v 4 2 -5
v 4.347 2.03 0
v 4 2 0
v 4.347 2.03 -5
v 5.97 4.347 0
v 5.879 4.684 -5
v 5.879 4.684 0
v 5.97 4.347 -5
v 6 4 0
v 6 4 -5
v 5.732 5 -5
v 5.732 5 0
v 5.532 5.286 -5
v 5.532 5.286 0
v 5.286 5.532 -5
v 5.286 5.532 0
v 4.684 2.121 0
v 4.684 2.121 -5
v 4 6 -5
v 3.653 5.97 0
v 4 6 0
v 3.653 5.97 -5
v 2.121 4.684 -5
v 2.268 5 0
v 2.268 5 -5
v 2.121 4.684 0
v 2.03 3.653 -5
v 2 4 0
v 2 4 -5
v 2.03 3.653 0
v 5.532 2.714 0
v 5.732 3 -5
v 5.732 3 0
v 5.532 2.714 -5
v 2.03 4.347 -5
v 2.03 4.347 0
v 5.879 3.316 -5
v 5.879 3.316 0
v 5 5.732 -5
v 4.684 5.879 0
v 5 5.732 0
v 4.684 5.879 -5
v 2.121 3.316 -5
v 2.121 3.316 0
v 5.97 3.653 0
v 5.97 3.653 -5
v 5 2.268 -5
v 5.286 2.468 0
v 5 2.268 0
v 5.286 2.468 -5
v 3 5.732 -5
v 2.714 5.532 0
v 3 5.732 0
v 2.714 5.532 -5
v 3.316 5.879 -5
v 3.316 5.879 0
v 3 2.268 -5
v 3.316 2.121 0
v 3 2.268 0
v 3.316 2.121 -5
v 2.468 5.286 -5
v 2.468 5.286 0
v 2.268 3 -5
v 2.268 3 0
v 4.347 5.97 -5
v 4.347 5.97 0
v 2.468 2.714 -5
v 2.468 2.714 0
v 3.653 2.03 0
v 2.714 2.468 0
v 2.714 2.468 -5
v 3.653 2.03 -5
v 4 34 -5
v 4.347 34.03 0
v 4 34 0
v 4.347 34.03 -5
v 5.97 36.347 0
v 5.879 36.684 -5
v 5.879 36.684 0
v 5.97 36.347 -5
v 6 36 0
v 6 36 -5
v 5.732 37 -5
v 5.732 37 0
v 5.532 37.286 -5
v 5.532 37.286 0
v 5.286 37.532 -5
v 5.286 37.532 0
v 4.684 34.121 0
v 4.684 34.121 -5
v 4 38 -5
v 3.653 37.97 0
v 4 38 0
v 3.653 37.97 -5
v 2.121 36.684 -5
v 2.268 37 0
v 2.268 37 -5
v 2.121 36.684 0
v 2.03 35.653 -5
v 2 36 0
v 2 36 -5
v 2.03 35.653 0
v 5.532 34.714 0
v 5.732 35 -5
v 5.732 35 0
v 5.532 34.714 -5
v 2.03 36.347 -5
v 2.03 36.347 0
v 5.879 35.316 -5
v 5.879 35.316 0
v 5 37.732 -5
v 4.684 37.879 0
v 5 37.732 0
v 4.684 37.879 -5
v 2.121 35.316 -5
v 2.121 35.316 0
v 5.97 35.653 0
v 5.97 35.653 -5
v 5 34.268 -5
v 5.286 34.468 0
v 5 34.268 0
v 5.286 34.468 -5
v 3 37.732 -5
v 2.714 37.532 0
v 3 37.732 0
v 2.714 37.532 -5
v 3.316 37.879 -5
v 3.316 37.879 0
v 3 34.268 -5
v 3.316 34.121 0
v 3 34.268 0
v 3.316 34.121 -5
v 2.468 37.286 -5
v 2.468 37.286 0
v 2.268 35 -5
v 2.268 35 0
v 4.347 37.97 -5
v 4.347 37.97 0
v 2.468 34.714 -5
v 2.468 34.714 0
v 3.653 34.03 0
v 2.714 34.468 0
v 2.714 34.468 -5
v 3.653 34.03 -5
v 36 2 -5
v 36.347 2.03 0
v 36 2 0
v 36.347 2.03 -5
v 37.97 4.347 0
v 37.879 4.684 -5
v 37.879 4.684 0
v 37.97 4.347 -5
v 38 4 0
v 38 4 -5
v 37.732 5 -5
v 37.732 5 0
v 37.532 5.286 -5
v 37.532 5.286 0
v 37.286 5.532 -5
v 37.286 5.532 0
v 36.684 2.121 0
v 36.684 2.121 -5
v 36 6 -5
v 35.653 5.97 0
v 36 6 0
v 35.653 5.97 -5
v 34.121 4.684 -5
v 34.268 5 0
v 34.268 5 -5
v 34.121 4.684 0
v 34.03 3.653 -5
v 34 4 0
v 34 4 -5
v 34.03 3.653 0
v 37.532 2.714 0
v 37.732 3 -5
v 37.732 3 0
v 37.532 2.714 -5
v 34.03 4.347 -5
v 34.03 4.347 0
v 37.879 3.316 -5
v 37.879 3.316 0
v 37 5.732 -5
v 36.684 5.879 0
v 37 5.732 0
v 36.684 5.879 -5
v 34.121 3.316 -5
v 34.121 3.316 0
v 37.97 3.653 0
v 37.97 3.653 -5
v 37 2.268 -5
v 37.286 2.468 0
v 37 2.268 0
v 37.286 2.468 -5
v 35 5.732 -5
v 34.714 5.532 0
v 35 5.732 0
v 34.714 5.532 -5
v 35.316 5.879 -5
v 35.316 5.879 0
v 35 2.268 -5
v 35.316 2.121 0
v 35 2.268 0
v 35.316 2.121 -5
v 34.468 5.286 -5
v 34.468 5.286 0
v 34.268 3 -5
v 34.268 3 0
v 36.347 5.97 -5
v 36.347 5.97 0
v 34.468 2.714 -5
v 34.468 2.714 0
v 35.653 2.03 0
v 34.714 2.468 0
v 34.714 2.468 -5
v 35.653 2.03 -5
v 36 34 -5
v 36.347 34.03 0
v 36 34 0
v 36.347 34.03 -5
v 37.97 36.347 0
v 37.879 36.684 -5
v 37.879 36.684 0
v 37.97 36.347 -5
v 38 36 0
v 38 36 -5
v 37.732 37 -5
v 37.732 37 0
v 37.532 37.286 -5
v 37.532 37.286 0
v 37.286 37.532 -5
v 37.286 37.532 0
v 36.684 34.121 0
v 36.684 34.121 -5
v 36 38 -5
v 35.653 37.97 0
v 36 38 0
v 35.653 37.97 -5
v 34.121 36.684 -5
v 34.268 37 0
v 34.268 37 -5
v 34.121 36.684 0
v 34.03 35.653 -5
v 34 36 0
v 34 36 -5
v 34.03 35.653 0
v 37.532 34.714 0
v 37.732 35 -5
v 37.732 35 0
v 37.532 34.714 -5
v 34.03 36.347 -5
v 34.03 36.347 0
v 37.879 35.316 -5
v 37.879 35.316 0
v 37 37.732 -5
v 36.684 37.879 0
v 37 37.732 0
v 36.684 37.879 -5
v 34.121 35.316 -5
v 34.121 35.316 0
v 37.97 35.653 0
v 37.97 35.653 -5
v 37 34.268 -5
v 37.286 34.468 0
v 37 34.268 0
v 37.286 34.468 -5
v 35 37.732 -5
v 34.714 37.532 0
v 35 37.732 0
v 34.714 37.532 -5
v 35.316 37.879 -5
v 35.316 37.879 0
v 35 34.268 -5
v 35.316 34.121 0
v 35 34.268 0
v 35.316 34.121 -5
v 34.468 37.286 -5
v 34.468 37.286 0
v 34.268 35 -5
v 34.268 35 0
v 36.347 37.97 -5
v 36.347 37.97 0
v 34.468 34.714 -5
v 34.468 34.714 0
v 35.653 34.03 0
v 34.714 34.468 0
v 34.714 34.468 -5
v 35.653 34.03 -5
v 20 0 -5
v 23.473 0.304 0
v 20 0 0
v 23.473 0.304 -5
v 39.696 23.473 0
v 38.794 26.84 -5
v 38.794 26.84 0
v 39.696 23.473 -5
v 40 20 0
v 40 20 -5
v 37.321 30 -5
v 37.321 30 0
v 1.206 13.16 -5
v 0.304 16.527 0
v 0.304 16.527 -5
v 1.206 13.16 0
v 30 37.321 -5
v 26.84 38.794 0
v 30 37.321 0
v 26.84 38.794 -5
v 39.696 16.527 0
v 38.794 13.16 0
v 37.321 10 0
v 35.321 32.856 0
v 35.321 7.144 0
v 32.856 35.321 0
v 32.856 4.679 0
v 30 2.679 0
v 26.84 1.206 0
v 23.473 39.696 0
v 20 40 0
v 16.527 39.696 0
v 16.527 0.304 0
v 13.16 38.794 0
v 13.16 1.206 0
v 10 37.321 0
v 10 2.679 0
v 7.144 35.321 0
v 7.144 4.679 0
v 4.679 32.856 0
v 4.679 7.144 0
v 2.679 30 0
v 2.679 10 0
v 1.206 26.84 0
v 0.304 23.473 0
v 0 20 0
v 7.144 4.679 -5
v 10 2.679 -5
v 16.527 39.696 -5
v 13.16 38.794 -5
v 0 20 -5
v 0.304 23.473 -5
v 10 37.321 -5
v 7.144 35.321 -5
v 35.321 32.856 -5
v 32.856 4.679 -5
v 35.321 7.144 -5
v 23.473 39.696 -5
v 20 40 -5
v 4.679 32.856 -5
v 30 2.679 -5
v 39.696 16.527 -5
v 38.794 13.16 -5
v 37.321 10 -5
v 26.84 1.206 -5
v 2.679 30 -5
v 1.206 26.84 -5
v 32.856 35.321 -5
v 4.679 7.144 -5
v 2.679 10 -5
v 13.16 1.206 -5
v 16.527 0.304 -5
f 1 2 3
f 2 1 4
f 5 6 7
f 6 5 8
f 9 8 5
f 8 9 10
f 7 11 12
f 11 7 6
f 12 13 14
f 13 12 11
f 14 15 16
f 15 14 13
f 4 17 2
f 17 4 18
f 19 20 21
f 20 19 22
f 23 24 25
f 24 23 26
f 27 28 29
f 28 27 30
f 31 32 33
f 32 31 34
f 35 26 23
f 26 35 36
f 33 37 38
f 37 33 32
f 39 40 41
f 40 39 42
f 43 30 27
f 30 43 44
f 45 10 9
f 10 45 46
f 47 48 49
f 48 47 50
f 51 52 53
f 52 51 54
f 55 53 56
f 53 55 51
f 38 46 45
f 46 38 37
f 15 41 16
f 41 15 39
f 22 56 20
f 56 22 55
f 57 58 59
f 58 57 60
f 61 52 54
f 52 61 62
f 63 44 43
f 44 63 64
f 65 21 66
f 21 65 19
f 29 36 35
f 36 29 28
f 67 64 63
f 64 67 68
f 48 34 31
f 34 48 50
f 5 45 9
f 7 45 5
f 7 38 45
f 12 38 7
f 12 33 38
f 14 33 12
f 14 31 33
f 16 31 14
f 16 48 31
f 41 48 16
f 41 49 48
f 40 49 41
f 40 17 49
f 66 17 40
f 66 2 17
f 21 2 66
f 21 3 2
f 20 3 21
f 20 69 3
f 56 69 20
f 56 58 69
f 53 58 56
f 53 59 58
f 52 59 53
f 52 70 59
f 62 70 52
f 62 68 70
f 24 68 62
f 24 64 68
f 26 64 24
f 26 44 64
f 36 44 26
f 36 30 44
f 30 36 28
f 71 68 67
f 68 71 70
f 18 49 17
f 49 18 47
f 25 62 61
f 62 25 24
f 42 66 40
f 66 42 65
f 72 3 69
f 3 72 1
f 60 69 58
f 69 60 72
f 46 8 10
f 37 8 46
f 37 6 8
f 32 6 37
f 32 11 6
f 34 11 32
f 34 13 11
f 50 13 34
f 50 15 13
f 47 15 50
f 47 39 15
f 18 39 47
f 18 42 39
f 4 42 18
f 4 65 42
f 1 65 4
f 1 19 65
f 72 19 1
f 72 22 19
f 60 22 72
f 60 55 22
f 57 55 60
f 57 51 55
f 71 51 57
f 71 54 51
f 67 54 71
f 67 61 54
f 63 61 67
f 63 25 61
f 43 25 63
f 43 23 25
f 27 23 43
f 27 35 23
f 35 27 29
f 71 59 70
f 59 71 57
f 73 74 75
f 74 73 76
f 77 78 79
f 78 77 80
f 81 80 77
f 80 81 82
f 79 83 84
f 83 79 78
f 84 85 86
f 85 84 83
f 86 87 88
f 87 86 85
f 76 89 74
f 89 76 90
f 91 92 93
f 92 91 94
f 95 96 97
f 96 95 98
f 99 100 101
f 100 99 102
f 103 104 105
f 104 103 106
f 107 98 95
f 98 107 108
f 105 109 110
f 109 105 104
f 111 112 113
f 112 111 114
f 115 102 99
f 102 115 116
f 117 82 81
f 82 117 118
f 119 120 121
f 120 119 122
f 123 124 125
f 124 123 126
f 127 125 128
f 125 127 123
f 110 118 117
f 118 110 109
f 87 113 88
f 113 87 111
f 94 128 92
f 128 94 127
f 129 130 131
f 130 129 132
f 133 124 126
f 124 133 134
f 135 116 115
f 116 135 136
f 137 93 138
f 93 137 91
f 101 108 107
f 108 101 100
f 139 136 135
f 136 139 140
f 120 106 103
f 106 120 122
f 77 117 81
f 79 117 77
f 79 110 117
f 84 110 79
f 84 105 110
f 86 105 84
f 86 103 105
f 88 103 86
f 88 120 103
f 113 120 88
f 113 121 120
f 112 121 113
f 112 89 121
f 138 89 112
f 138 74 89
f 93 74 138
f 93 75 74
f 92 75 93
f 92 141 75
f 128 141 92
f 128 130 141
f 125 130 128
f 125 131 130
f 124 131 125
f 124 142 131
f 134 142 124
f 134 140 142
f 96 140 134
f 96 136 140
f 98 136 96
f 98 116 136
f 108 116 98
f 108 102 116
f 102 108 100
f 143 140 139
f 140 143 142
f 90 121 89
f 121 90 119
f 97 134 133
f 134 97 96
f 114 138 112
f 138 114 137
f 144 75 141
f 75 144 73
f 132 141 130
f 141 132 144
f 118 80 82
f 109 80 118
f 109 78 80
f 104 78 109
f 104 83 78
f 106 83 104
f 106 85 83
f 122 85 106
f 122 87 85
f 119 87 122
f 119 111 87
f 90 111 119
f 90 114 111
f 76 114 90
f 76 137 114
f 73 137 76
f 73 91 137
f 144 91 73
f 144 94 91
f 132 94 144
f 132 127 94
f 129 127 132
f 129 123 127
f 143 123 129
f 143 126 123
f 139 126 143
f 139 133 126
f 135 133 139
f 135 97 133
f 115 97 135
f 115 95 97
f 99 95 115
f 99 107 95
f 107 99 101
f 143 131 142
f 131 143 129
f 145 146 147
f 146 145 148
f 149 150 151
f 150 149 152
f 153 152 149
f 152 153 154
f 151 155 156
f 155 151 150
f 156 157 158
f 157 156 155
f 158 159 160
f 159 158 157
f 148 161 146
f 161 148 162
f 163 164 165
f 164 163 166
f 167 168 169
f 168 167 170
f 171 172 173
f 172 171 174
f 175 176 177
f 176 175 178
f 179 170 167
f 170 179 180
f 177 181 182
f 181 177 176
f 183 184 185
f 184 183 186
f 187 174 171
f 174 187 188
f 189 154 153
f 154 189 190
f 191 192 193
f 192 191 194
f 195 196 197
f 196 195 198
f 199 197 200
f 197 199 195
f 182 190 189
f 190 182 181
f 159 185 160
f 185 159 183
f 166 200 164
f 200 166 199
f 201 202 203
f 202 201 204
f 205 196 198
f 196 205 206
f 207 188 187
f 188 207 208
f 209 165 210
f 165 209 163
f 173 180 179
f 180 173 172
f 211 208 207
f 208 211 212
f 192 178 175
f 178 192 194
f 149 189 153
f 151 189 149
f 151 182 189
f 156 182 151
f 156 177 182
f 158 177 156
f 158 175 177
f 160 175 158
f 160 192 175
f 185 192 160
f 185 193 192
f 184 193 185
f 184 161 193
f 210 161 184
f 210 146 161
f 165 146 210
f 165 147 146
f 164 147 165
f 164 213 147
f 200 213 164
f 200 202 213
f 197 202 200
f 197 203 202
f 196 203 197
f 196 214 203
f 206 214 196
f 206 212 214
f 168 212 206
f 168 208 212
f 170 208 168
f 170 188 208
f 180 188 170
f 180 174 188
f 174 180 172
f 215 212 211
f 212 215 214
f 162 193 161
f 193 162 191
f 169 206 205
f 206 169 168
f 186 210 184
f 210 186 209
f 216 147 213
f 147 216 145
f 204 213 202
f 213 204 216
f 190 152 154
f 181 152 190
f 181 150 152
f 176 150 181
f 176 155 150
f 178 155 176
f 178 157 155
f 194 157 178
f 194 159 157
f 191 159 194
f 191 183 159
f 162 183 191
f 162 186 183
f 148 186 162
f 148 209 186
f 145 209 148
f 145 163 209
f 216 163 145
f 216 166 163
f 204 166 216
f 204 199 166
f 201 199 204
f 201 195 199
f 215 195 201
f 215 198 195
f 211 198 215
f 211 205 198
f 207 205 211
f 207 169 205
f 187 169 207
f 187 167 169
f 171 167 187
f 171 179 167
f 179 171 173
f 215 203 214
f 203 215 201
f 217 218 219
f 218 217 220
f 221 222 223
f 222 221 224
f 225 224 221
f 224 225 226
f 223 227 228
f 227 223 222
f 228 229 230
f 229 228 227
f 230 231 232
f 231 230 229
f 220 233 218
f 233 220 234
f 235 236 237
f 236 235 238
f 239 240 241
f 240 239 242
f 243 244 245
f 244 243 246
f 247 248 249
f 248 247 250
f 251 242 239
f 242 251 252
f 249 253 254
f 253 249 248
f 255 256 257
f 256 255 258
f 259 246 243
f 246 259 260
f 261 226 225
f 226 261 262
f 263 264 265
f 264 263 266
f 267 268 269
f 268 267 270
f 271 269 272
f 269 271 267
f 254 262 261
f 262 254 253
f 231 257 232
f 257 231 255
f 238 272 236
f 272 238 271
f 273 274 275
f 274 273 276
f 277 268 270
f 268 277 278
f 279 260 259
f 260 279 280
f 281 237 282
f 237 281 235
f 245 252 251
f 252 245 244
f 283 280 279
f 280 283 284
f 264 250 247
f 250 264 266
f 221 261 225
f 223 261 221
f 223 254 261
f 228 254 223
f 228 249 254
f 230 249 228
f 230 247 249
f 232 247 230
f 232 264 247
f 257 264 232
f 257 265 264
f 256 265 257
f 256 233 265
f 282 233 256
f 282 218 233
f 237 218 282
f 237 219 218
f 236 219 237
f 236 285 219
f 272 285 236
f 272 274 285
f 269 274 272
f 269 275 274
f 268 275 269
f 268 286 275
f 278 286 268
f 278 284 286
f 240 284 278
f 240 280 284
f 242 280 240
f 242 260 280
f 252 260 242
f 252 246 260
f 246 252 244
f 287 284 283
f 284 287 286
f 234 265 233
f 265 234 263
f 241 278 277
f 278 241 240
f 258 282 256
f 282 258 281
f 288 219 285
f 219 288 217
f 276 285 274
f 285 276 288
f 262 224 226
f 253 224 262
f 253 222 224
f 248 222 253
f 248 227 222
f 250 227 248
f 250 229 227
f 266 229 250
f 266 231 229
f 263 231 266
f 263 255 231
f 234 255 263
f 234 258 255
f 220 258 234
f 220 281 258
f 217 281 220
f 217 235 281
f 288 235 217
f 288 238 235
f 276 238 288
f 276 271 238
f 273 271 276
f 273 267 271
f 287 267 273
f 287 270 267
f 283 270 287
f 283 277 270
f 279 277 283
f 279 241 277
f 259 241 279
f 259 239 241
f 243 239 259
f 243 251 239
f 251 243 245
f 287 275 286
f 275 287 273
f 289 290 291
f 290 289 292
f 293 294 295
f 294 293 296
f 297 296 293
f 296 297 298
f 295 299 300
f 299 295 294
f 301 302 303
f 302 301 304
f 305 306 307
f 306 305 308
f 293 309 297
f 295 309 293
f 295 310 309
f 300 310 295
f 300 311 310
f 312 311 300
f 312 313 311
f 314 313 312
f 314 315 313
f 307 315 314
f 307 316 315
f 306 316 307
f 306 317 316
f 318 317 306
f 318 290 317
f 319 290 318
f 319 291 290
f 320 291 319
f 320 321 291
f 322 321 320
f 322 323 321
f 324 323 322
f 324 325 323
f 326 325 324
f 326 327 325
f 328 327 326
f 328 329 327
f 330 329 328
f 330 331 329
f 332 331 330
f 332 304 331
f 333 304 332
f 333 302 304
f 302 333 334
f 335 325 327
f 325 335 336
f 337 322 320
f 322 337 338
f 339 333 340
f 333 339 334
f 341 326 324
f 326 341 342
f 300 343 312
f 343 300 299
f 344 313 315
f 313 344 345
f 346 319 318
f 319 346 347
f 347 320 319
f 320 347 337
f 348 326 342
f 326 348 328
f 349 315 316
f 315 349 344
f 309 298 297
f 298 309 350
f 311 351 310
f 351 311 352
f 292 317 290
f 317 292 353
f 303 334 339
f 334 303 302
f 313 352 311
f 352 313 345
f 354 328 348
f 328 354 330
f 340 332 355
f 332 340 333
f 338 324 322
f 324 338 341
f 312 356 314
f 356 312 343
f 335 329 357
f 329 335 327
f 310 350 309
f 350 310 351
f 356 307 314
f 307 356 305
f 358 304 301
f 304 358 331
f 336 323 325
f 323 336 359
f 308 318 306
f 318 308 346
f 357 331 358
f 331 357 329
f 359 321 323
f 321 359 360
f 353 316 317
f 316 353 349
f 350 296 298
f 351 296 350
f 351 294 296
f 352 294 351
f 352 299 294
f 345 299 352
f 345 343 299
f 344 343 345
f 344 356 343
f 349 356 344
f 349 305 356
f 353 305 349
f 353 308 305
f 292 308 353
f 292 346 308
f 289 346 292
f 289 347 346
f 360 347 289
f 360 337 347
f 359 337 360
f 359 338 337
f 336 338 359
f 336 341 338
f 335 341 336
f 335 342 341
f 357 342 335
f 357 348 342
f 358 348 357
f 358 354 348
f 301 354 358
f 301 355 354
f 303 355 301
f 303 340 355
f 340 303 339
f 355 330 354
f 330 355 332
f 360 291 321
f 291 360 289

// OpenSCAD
// file: posts.scad
/* Developed by Alex Grutter */

$fn = 36;

four_posts_with_supports(10, 3, 2, 25, 50, 5, 1, [0,0,0,0], 1, true);

module four_posts(post_height, post_outer_diameter, post_inner_diameter, post_spacing_width, post_spacing_length){
    difference()
    {
		/* Outer part */
		union()
		{
            translate([0, 0, 0])
            {
                cylinder(h = post_height, d = post_outer_diameter);
            }
            translate([0, post_spacing_length + 0, 0])
            {
                cylinder(h = post_height, d = post_outer_diameter);
            }
            translate([post_spacing_width + 0, 0, 0])
            {
                cylinder(h = post_height, d = post_outer_diameter);
            }
            translate([post_spacing_width + 0, post_spacing_length + 0, 0])
            {
                cylinder(h = post_height, d = post_outer_diameter);
            }
		}
		/* Inner hole */
        union()
        {
            translate([0, 0, -1])
            {
                cylinder(h = post_height+2, d = post_inner_diameter);
            }
            translate([0, post_spacing_length + 0, -1])
            {
                cylinder(h = post_height+2, d = post_inner_diameter);
            }
            translate([post_spacing_width + 0, 0, -1])
            {
                cylinder(h = post_height+2, d = post_inner_diameter);
            }
            translate([post_spacing_width + 0, post_spacing_length + 0, -1])
            {
                cylinder(h = post_height+2, d = post_inner_diameter);
            }
        }
	}
};

module four_posts_with_supports(post_height, post_outer_diameter, post_inner_diameter, post_spacing_width, post_spacing_length, support_diameter, support_count, support_start_angle, support_thickness, flip){
    difference()
    {
		/* Outer part */
		union()
		{
            translate([0, 0, 0])
            {
                cylinder(h = post_height, d = post_outer_diameter);
				for(support = [0 : support_count])
				{
					if(flip)
					{
						translate([0, 0, post_height])
						rotate([support_start_angle[0] + ( support * (360 / support_count)),90,0])
						translate([0, 0, -(support_thickness / 2)])
						linear_extrude(support_thickness)
						polygon([[post_height, (post_inner_diameter / 2)],[0, (post_inner_diameter / 2)],[0,(support_diameter / 2)]], [[0,1,2]]);
					}
					else
					{
						rotate([support_start_angle[0] + ( support * (360 / support_count)),-90,0])
						translate([0, 0, -(support_thickness / 2)])
						linear_extrude(support_thickness)
						polygon([[post_height, (post_inner_diameter / 2)],[0, (post_inner_diameter / 2)],[0, (support_diameter / 2)]], [[0,1,2]]);
					}
				}
            }
            translate([0, post_spacing_length + 0, 0])
            {
                cylinder(h = post_height, d = post_outer_diameter);
				for(support = [0 : support_count])
				{
					if(flip)
					{
						translate([0, 0, post_height])
						rotate([support_start_angle[1] + ( support * (360 / support_count)),90,0])
						translate([0, 0, -(support_thickness / 2)])
						linear_extrude(support_thickness)
						polygon([[post_height, (post_inner_diameter / 2)],[0, (post_inner_diameter / 2)],[0,(support_diameter / 2)]], [[0,1,2]]);
					}
					else
					{
						rotate([support_start_angle[1] + ( support * (360 / support_count)),-90,0])
						translate([0, 0, -(support_thickness / 2)])
						linear_extrude(support_thickness)
						polygon([[post_height, (post_inner_diameter / 2)],[0, (post_inner_diameter / 2)],[0,(support_diameter / 2)]], [[0,1,2]]);
					}
				}
            }
            translate([post_spacing_width + 0, 0, 0])
            {
                cylinder(h = post_height, d = post_outer_diameter);
				for(support = [0 : support_count])
				{
					if(flip)
					{
						translate([0, 0, post_height])
						rotate([support_start_angle[2] + ( support * (360 / support_count)),90,0])
						translate([0, 0, -(support_thickness / 2)])
						linear_extrude(support_thickness)
						polygon([[post_height, (post_inner_diameter / 2)],[0, (post_inner_diameter / 2)],[0,(support_diameter / 2)]], [[0,1,2]]);
					}
					else
					{
						rotate([support_start_angle[2] + ( support * (360 / support_count)),-90,0])
						translate([0, 0, -(support_thickness / 2)])
						linear_extrude(support_thickness)
						polygon([[post_height, (post_inner_diameter / 2)],[0, (post_inner_diameter / 2)],[0,(support_diameter / 2)]], [[0,1,2]]);
					}
				}
            }
            translate([post_spacing_width + 0, post_spacing_length + 0, 0])
            {
                cylinder(h = post_height, d = post_outer_diameter);
				for(support = [0 : support_count])
				{
					if(flip)
					{
						translate([0, 0, post_height])
						rotate([support_start_angle[3] + ( support * (360 / support_count)),90,0])
						translate([0, 0, -(support_thickness / 2)])
						linear_extrude(support_thickness)
						polygon([[post_height, (post_inner_diameter / 2)],[0, (post_inner_diameter / 2)],[0,(support_diameter / 2)]], [[0,1,2]]);
					}
					else
					{
						rotate([support_start_angle[3] + ( support * (360 / support_count)),-90,0])
						translate([0, 0, -(support_thickness / 2)])
						linear_extrude(support_thickness)
						polygon([[post_height, (post_inner_diameter / 2)],[0, (post_inner_diameter / 2)],[0,(support_diameter / 2)]], [[0,1,2]]);
					}
				}
            }
		}
        
		/* Inner hole */
        union()
        {
            translate([0, 0, -1])
            {
                cylinder(h = post_height+2, d = post_inner_diameter);
            }
            translate([0, post_spacing_length + 0, -1])
            {
                cylinder(h = post_height+2, d = post_inner_diameter);
            }
            translate([post_spacing_width + 0, 0, -1])
            {
                cylinder(h = post_height+2, d = post_inner_diameter);
            }
            translate([post_spacing_width + 0, post_spacing_length + 0, -1])
            {
                cylinder(h = post_height+2, d = post_inner_diameter);
            }
        }
	}
};
// main file
use <posts.scad>

/* Examples for viewing */
noctua_40mm_fan_holes();

module noctua_40mm_fan_holes()
{
    /* Hole parameters */
    mount_hole_depth            = 5;
    hole_inner_diameter         = 4;
    
    /* Based on drawings */
    total_width                 = 40;
    mount_hole_spacing          = 32;
    
    /* Calculated offset from edge to start of hole */
    mount_edge_offset           = (total_width - mount_hole_spacing) / 2;
    
    /* Fan hole circular offset clearance */
    fan_hole_diameter           = 40.0;
    
    /* Length positioning parameters */
    hole1_offset_length         = mount_edge_offset;
    hole2_offset_length         = hole1_offset_length;
    hole3_offset_length         = mount_edge_offset + mount_hole_spacing;
    hole4_offset_length         = hole3_offset_length;
    hole5_offset_length         = total_width / 2;
    
    /* Width positioning parameters */
    hole1_offset_width          = mount_edge_offset + mount_hole_spacing;
    hole2_offset_width          = mount_edge_offset;
    hole3_offset_width          = hole1_offset_width;
    hole4_offset_width          = hole2_offset_width;
    hole5_offset_width          = total_width / 2;
    
    /* Hole 1: */
    translate([hole1_offset_length, total_width - hole1_offset_width, -mount_hole_depth])
    four_posts(mount_hole_depth, hole_inner_diameter, 0, 0, 0);
    
    /* Hole 2: */
    translate([hole2_offset_length, total_width - hole2_offset_width, -mount_hole_depth])
    four_posts(mount_hole_depth, hole_inner_diameter, 0, 0, 0);
        
    /* Hole 3: */
    translate([hole3_offset_length, total_width - hole3_offset_width, -mount_hole_depth])
    four_posts(mount_hole_depth, hole_inner_diameter, 0, 0, 0);
    
    /* Hole 4: */
    translate([hole4_offset_length, total_width - hole4_offset_width, -mount_hole_depth])
    four_posts(mount_hole_depth, hole_inner_diameter, 0, 0, 0);

    /* Hole 5: */
    translate([hole5_offset_length, total_width - hole5_offset_width, -mount_hole_depth])
    four_posts(mount_hole_depth, fan_hole_diameter, 0, 0, 0);
}
